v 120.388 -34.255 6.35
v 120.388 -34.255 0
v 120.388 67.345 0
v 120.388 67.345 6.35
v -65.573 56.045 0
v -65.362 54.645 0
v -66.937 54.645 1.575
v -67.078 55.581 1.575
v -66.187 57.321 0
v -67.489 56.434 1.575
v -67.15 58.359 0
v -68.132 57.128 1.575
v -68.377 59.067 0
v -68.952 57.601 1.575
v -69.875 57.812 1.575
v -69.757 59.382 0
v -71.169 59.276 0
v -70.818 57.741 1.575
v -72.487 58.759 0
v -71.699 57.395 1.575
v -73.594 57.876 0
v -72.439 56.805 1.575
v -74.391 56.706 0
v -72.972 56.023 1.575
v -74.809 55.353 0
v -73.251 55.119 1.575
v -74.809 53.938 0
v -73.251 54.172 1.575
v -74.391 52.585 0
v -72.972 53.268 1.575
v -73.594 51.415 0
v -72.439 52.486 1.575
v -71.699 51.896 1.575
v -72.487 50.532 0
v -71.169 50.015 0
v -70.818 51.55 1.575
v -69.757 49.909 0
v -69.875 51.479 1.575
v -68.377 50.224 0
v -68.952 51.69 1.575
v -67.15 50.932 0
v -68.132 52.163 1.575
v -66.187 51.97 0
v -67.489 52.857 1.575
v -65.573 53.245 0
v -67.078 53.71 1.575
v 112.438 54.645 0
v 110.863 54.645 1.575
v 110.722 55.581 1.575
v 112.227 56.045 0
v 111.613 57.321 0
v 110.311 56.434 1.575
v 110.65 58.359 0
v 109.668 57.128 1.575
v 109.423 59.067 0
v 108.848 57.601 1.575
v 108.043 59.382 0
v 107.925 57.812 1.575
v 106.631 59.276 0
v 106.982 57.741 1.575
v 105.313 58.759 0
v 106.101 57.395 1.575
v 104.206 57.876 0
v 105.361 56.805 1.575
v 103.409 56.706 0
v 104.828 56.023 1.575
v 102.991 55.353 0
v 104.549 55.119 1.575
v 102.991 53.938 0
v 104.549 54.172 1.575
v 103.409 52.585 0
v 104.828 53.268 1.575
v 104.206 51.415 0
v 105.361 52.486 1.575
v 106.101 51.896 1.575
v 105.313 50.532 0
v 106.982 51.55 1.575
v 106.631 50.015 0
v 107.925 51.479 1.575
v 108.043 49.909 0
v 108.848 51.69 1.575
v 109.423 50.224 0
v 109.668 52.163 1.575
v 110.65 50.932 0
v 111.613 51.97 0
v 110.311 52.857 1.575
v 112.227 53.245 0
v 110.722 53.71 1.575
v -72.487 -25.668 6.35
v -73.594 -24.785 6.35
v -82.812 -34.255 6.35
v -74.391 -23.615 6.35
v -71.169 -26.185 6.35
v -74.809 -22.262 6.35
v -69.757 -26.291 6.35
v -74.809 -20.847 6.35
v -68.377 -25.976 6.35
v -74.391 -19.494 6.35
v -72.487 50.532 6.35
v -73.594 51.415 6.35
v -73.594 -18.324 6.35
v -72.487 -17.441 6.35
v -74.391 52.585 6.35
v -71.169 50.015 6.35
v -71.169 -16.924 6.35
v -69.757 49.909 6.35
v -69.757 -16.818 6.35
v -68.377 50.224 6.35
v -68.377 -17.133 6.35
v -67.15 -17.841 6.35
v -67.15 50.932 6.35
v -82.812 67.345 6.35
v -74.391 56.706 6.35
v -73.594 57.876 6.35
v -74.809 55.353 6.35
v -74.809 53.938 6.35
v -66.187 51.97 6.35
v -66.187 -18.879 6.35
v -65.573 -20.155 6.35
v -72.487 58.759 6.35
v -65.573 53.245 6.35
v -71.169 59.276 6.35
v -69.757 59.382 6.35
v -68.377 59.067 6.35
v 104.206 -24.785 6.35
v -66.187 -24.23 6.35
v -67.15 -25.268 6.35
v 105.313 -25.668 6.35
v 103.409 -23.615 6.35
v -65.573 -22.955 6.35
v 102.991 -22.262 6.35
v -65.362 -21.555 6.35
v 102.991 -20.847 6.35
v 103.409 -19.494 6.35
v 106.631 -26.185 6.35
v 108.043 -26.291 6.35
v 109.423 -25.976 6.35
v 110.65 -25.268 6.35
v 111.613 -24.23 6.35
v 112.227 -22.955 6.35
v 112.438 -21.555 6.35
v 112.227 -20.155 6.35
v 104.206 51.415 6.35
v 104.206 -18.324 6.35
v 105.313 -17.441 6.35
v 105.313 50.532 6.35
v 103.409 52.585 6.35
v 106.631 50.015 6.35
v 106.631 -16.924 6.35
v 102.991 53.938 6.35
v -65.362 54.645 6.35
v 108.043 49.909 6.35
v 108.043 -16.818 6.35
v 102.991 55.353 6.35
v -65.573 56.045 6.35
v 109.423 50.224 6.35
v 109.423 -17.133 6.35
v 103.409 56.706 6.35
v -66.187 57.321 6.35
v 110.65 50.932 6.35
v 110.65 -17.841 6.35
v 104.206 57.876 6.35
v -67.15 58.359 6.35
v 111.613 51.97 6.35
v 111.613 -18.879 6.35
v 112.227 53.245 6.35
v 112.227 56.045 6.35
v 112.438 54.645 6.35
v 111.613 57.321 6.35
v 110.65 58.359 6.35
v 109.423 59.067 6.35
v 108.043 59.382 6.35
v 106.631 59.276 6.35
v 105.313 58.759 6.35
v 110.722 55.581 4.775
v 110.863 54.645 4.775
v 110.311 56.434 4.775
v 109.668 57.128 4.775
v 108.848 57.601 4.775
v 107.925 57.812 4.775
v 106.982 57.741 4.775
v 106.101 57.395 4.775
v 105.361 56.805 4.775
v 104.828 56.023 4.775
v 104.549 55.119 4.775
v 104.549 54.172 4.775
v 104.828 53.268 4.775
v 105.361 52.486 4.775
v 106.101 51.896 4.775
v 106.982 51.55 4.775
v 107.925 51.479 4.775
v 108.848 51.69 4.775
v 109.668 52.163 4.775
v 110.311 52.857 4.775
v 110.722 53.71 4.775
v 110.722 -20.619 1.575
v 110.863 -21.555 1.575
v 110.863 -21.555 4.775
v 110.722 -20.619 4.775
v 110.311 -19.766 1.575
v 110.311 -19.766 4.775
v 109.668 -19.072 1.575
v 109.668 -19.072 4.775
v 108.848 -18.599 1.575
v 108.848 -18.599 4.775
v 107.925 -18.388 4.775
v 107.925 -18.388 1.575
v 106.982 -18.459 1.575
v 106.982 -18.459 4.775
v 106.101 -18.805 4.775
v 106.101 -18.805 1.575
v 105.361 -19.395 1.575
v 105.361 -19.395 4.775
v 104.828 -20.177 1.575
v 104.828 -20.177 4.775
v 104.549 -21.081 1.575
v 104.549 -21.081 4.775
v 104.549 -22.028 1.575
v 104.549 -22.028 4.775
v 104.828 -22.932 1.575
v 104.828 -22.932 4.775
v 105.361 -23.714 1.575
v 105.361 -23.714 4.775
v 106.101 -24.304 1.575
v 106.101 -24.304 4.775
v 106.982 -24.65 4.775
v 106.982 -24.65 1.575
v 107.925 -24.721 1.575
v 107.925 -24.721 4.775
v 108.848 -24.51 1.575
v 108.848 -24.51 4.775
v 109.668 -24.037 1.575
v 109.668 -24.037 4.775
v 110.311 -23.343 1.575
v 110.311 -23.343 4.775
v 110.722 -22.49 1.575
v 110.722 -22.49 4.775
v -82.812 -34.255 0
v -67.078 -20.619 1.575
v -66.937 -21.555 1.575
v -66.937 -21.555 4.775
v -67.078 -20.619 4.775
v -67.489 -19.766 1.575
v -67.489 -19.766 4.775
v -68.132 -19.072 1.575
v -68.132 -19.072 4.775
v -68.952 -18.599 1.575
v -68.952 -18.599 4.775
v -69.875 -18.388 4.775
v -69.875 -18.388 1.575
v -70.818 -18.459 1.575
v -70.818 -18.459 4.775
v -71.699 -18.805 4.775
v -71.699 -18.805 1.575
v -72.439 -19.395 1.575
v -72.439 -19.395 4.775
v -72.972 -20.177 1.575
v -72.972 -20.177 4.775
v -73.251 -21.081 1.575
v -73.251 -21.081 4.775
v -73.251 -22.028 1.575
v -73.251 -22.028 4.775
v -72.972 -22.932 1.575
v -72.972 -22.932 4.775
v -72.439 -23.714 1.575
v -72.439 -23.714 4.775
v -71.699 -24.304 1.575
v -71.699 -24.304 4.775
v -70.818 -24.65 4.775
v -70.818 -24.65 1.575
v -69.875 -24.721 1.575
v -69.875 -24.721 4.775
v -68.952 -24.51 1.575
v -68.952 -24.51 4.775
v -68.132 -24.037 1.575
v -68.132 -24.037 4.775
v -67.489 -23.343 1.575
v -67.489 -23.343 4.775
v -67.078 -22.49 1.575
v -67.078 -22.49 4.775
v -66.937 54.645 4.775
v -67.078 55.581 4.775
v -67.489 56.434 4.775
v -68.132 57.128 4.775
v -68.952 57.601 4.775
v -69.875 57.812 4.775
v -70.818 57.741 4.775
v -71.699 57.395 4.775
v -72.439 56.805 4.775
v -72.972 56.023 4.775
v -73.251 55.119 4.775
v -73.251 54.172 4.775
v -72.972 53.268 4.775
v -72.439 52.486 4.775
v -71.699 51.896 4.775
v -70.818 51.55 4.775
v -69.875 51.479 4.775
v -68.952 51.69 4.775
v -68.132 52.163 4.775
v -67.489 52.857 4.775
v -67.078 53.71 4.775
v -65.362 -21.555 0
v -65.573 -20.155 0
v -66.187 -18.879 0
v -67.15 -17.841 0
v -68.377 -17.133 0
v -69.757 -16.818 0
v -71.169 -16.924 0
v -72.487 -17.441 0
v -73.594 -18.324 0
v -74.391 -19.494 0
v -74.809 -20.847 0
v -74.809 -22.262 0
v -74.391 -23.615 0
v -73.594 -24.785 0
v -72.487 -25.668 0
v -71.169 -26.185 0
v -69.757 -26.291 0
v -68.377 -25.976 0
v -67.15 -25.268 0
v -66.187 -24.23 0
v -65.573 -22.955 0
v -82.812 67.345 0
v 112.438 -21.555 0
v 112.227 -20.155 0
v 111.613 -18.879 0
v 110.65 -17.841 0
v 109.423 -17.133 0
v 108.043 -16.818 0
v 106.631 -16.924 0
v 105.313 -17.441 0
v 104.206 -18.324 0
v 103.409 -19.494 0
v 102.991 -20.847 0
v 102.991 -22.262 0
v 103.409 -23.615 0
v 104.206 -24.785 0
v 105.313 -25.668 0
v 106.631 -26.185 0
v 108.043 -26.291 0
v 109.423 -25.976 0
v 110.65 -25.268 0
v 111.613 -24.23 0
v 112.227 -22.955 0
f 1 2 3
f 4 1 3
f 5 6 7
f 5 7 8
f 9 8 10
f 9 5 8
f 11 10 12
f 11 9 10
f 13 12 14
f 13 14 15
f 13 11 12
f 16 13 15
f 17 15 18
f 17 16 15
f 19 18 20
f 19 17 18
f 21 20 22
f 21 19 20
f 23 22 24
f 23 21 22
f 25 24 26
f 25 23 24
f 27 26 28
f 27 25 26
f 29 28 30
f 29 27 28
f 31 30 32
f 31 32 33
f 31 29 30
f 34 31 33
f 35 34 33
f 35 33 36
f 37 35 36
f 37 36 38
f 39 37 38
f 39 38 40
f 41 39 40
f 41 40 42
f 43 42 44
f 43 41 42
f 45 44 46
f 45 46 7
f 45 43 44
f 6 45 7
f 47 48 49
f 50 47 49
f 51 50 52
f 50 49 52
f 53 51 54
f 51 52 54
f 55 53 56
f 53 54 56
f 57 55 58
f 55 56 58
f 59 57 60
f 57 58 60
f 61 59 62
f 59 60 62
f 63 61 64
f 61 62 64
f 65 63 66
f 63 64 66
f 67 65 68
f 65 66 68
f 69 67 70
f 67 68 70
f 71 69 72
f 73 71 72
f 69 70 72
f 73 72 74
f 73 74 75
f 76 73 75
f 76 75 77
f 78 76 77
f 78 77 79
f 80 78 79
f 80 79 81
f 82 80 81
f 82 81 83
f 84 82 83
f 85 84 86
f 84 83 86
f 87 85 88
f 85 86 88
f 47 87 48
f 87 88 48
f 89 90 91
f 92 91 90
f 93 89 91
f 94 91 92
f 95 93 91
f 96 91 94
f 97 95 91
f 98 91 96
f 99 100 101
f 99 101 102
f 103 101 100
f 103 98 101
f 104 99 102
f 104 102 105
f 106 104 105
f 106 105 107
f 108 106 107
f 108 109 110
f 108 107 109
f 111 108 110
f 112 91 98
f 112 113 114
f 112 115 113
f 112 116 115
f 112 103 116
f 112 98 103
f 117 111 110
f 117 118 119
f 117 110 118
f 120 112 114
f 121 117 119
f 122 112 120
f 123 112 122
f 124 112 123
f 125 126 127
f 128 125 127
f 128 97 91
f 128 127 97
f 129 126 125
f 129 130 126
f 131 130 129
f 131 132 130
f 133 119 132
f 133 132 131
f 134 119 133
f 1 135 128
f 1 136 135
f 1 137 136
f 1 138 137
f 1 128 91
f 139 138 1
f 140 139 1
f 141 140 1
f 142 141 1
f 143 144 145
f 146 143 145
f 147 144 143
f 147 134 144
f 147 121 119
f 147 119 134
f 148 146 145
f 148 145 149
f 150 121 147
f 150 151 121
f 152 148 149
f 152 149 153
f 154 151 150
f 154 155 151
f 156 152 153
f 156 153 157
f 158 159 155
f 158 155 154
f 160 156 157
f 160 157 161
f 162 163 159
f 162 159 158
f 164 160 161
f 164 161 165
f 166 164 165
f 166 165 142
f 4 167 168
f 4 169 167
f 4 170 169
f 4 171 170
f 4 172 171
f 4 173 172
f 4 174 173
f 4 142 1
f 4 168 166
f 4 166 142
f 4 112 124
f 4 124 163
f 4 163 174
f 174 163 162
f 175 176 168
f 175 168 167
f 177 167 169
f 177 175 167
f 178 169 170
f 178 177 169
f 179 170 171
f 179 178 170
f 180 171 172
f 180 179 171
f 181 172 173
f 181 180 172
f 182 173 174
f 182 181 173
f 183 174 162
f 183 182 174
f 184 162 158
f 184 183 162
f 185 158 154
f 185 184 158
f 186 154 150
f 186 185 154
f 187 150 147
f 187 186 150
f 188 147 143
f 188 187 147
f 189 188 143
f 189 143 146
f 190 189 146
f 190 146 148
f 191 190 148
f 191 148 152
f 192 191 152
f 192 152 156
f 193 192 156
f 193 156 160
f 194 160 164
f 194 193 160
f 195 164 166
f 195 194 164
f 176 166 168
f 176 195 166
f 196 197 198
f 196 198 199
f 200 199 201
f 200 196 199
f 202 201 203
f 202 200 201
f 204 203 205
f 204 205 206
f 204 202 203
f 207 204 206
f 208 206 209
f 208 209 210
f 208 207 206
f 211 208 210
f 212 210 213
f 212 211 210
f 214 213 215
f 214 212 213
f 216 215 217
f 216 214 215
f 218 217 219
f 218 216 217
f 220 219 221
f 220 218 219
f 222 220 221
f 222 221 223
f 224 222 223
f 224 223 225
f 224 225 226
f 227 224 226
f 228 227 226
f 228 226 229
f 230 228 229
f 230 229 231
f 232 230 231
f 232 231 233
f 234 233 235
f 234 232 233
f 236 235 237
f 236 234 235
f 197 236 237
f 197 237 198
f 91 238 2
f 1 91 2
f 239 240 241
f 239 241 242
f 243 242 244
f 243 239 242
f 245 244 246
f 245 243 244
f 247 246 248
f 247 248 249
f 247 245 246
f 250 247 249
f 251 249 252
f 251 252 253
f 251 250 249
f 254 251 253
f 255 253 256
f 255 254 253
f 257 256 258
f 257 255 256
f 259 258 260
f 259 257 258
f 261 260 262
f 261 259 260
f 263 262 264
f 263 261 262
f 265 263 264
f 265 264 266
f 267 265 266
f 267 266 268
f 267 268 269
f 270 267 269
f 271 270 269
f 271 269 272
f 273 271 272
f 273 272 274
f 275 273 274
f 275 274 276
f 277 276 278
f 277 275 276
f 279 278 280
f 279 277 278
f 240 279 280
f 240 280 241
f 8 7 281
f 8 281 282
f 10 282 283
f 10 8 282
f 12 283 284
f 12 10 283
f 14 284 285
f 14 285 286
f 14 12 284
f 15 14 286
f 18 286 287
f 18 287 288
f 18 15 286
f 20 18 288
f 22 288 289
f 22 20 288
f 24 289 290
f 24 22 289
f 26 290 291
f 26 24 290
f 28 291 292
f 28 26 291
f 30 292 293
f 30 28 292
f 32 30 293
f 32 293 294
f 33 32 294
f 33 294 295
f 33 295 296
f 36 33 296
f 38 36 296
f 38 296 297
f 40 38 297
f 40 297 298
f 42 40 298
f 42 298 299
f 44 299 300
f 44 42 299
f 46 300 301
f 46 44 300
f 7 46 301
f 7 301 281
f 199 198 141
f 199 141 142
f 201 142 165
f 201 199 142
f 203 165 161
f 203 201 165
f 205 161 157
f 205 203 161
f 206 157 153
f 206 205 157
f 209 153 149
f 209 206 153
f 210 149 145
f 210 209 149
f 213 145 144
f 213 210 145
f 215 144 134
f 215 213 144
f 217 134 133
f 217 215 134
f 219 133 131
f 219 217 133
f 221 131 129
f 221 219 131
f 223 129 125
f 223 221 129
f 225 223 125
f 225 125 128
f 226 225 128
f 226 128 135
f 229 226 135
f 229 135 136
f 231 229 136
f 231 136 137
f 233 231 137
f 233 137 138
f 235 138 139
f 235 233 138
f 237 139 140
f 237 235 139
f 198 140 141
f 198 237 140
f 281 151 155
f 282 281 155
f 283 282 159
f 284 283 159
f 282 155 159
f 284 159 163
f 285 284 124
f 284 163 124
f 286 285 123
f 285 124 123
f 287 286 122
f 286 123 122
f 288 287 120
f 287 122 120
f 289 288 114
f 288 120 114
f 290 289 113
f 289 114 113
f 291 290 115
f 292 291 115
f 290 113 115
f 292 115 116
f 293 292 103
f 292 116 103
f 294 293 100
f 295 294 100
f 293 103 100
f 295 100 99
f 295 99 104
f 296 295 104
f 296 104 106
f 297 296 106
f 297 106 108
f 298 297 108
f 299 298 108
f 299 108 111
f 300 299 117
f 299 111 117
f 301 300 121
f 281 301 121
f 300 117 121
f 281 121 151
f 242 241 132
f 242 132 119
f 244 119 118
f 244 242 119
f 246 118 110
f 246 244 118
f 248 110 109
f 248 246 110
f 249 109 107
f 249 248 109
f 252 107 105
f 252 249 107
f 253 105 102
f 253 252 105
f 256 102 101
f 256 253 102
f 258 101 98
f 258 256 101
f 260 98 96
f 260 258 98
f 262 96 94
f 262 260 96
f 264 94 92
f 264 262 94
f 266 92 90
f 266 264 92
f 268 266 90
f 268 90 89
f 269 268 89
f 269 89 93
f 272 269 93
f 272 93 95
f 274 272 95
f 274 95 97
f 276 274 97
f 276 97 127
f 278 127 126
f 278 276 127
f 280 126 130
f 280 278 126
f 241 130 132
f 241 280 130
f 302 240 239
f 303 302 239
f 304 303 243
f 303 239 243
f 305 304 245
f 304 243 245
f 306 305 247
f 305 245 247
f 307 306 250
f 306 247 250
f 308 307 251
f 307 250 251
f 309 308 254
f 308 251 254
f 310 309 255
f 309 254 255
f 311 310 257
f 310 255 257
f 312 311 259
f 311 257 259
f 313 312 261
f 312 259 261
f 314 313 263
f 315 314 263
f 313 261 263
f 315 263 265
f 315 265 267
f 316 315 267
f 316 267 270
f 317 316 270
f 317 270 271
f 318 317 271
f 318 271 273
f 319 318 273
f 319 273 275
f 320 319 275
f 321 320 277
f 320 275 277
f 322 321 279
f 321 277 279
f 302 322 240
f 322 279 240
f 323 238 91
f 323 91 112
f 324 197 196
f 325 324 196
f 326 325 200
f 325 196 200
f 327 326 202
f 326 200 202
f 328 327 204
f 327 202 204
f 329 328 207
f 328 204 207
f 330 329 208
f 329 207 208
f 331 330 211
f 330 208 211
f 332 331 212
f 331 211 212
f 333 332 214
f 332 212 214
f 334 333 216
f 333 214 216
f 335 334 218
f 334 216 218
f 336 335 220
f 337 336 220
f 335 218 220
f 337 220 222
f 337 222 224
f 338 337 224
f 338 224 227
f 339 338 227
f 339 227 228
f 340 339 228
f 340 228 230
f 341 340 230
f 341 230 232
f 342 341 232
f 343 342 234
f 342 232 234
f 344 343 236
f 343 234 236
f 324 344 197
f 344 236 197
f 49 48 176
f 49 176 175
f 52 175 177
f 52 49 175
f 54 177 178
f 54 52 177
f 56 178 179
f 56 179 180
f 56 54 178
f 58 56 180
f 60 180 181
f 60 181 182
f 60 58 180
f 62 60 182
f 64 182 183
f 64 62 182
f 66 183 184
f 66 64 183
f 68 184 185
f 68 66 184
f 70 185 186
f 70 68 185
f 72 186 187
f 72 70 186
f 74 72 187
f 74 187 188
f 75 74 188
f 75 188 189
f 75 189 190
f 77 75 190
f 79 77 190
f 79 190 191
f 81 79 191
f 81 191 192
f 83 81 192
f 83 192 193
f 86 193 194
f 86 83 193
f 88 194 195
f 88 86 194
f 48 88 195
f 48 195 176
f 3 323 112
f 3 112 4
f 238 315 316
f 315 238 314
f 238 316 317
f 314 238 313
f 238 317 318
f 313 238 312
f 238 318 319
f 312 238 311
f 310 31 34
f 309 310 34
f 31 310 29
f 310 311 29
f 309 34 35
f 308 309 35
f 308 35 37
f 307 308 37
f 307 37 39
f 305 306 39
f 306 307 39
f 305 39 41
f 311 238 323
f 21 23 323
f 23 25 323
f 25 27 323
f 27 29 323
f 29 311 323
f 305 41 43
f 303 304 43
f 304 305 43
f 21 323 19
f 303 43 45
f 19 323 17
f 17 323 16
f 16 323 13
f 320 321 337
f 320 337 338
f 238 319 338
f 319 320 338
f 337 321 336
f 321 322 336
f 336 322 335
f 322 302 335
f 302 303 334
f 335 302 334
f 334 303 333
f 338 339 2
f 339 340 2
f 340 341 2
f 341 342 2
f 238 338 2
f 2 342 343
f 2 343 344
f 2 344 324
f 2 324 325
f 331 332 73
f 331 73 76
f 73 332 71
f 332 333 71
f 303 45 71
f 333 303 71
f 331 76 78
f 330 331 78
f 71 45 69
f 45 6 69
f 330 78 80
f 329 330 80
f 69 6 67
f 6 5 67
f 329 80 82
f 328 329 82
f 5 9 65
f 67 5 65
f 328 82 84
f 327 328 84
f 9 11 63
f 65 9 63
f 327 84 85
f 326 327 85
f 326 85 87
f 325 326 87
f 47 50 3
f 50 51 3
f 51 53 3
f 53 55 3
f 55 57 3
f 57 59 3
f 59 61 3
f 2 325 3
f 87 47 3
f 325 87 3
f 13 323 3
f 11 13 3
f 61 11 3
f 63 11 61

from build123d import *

# Parameters (mm, degrees)
F0_W     = 203.2
F0_H     = 101.6
F0_R     = 3.175
F1_DEPTH = 6.35
F2_SIZE2 = 1.5748
F2_SIZE  = 1.5748
F3_SIZE2 = 1.5748
F3_SIZE  = 1.5748


with BuildPart() as f1:
    # F0 (on Top) → F1 (new body)
    with BuildSketch(Plane.XY):
        with Locations((18.788079, 16.545452)):
            Rectangle(F0_W, F0_H)
        with Locations((-70.111921, -21.554548)):
            Circle(F0_R, mode=Mode.SUBTRACT)
        with Locations((107.688079, -21.554548)):
            Circle(F0_R, mode=Mode.SUBTRACT)
        with Locations((-70.111921, 54.645452)):
            Circle(F0_R, mode=Mode.SUBTRACT)
        with Locations((107.688079, 54.645452)):
            Circle(F0_R, mode=Mode.SUBTRACT)
    extrude(amount=F1_DEPTH)

    # F2
    f2_edges = [f1.edges().sort_by_distance(p)[0] for p in [
        (-66.936921, 54.645452, 3.175),
        (-73.286921, 54.645452, 0),
        (-73.286921, 54.645452, 6.35),
    ]]
    chamfer(f2_edges, length=F2_SIZE, length2=F2_SIZE2)

    # F3
    f3_edges = [f1.edges().sort_by_distance(p)[0] for p in [
        (110.863079, 54.645452, 3.175),
        (104.513079, 54.645452, 0),
        (104.513079, 54.645452, 6.35),
        (110.863079, -21.554548, 3.175),
        (104.513079, -21.554548, 0),
        (104.513079, -21.554548, 6.35),
        (-66.936921, -21.554548, 3.175),
        (-73.286921, -21.554548, 0),
        (-73.286921, -21.554548, 6.35),
    ]]
    chamfer(f3_edges, length=F3_SIZE, length2=F3_SIZE2)


solid = f1.part
